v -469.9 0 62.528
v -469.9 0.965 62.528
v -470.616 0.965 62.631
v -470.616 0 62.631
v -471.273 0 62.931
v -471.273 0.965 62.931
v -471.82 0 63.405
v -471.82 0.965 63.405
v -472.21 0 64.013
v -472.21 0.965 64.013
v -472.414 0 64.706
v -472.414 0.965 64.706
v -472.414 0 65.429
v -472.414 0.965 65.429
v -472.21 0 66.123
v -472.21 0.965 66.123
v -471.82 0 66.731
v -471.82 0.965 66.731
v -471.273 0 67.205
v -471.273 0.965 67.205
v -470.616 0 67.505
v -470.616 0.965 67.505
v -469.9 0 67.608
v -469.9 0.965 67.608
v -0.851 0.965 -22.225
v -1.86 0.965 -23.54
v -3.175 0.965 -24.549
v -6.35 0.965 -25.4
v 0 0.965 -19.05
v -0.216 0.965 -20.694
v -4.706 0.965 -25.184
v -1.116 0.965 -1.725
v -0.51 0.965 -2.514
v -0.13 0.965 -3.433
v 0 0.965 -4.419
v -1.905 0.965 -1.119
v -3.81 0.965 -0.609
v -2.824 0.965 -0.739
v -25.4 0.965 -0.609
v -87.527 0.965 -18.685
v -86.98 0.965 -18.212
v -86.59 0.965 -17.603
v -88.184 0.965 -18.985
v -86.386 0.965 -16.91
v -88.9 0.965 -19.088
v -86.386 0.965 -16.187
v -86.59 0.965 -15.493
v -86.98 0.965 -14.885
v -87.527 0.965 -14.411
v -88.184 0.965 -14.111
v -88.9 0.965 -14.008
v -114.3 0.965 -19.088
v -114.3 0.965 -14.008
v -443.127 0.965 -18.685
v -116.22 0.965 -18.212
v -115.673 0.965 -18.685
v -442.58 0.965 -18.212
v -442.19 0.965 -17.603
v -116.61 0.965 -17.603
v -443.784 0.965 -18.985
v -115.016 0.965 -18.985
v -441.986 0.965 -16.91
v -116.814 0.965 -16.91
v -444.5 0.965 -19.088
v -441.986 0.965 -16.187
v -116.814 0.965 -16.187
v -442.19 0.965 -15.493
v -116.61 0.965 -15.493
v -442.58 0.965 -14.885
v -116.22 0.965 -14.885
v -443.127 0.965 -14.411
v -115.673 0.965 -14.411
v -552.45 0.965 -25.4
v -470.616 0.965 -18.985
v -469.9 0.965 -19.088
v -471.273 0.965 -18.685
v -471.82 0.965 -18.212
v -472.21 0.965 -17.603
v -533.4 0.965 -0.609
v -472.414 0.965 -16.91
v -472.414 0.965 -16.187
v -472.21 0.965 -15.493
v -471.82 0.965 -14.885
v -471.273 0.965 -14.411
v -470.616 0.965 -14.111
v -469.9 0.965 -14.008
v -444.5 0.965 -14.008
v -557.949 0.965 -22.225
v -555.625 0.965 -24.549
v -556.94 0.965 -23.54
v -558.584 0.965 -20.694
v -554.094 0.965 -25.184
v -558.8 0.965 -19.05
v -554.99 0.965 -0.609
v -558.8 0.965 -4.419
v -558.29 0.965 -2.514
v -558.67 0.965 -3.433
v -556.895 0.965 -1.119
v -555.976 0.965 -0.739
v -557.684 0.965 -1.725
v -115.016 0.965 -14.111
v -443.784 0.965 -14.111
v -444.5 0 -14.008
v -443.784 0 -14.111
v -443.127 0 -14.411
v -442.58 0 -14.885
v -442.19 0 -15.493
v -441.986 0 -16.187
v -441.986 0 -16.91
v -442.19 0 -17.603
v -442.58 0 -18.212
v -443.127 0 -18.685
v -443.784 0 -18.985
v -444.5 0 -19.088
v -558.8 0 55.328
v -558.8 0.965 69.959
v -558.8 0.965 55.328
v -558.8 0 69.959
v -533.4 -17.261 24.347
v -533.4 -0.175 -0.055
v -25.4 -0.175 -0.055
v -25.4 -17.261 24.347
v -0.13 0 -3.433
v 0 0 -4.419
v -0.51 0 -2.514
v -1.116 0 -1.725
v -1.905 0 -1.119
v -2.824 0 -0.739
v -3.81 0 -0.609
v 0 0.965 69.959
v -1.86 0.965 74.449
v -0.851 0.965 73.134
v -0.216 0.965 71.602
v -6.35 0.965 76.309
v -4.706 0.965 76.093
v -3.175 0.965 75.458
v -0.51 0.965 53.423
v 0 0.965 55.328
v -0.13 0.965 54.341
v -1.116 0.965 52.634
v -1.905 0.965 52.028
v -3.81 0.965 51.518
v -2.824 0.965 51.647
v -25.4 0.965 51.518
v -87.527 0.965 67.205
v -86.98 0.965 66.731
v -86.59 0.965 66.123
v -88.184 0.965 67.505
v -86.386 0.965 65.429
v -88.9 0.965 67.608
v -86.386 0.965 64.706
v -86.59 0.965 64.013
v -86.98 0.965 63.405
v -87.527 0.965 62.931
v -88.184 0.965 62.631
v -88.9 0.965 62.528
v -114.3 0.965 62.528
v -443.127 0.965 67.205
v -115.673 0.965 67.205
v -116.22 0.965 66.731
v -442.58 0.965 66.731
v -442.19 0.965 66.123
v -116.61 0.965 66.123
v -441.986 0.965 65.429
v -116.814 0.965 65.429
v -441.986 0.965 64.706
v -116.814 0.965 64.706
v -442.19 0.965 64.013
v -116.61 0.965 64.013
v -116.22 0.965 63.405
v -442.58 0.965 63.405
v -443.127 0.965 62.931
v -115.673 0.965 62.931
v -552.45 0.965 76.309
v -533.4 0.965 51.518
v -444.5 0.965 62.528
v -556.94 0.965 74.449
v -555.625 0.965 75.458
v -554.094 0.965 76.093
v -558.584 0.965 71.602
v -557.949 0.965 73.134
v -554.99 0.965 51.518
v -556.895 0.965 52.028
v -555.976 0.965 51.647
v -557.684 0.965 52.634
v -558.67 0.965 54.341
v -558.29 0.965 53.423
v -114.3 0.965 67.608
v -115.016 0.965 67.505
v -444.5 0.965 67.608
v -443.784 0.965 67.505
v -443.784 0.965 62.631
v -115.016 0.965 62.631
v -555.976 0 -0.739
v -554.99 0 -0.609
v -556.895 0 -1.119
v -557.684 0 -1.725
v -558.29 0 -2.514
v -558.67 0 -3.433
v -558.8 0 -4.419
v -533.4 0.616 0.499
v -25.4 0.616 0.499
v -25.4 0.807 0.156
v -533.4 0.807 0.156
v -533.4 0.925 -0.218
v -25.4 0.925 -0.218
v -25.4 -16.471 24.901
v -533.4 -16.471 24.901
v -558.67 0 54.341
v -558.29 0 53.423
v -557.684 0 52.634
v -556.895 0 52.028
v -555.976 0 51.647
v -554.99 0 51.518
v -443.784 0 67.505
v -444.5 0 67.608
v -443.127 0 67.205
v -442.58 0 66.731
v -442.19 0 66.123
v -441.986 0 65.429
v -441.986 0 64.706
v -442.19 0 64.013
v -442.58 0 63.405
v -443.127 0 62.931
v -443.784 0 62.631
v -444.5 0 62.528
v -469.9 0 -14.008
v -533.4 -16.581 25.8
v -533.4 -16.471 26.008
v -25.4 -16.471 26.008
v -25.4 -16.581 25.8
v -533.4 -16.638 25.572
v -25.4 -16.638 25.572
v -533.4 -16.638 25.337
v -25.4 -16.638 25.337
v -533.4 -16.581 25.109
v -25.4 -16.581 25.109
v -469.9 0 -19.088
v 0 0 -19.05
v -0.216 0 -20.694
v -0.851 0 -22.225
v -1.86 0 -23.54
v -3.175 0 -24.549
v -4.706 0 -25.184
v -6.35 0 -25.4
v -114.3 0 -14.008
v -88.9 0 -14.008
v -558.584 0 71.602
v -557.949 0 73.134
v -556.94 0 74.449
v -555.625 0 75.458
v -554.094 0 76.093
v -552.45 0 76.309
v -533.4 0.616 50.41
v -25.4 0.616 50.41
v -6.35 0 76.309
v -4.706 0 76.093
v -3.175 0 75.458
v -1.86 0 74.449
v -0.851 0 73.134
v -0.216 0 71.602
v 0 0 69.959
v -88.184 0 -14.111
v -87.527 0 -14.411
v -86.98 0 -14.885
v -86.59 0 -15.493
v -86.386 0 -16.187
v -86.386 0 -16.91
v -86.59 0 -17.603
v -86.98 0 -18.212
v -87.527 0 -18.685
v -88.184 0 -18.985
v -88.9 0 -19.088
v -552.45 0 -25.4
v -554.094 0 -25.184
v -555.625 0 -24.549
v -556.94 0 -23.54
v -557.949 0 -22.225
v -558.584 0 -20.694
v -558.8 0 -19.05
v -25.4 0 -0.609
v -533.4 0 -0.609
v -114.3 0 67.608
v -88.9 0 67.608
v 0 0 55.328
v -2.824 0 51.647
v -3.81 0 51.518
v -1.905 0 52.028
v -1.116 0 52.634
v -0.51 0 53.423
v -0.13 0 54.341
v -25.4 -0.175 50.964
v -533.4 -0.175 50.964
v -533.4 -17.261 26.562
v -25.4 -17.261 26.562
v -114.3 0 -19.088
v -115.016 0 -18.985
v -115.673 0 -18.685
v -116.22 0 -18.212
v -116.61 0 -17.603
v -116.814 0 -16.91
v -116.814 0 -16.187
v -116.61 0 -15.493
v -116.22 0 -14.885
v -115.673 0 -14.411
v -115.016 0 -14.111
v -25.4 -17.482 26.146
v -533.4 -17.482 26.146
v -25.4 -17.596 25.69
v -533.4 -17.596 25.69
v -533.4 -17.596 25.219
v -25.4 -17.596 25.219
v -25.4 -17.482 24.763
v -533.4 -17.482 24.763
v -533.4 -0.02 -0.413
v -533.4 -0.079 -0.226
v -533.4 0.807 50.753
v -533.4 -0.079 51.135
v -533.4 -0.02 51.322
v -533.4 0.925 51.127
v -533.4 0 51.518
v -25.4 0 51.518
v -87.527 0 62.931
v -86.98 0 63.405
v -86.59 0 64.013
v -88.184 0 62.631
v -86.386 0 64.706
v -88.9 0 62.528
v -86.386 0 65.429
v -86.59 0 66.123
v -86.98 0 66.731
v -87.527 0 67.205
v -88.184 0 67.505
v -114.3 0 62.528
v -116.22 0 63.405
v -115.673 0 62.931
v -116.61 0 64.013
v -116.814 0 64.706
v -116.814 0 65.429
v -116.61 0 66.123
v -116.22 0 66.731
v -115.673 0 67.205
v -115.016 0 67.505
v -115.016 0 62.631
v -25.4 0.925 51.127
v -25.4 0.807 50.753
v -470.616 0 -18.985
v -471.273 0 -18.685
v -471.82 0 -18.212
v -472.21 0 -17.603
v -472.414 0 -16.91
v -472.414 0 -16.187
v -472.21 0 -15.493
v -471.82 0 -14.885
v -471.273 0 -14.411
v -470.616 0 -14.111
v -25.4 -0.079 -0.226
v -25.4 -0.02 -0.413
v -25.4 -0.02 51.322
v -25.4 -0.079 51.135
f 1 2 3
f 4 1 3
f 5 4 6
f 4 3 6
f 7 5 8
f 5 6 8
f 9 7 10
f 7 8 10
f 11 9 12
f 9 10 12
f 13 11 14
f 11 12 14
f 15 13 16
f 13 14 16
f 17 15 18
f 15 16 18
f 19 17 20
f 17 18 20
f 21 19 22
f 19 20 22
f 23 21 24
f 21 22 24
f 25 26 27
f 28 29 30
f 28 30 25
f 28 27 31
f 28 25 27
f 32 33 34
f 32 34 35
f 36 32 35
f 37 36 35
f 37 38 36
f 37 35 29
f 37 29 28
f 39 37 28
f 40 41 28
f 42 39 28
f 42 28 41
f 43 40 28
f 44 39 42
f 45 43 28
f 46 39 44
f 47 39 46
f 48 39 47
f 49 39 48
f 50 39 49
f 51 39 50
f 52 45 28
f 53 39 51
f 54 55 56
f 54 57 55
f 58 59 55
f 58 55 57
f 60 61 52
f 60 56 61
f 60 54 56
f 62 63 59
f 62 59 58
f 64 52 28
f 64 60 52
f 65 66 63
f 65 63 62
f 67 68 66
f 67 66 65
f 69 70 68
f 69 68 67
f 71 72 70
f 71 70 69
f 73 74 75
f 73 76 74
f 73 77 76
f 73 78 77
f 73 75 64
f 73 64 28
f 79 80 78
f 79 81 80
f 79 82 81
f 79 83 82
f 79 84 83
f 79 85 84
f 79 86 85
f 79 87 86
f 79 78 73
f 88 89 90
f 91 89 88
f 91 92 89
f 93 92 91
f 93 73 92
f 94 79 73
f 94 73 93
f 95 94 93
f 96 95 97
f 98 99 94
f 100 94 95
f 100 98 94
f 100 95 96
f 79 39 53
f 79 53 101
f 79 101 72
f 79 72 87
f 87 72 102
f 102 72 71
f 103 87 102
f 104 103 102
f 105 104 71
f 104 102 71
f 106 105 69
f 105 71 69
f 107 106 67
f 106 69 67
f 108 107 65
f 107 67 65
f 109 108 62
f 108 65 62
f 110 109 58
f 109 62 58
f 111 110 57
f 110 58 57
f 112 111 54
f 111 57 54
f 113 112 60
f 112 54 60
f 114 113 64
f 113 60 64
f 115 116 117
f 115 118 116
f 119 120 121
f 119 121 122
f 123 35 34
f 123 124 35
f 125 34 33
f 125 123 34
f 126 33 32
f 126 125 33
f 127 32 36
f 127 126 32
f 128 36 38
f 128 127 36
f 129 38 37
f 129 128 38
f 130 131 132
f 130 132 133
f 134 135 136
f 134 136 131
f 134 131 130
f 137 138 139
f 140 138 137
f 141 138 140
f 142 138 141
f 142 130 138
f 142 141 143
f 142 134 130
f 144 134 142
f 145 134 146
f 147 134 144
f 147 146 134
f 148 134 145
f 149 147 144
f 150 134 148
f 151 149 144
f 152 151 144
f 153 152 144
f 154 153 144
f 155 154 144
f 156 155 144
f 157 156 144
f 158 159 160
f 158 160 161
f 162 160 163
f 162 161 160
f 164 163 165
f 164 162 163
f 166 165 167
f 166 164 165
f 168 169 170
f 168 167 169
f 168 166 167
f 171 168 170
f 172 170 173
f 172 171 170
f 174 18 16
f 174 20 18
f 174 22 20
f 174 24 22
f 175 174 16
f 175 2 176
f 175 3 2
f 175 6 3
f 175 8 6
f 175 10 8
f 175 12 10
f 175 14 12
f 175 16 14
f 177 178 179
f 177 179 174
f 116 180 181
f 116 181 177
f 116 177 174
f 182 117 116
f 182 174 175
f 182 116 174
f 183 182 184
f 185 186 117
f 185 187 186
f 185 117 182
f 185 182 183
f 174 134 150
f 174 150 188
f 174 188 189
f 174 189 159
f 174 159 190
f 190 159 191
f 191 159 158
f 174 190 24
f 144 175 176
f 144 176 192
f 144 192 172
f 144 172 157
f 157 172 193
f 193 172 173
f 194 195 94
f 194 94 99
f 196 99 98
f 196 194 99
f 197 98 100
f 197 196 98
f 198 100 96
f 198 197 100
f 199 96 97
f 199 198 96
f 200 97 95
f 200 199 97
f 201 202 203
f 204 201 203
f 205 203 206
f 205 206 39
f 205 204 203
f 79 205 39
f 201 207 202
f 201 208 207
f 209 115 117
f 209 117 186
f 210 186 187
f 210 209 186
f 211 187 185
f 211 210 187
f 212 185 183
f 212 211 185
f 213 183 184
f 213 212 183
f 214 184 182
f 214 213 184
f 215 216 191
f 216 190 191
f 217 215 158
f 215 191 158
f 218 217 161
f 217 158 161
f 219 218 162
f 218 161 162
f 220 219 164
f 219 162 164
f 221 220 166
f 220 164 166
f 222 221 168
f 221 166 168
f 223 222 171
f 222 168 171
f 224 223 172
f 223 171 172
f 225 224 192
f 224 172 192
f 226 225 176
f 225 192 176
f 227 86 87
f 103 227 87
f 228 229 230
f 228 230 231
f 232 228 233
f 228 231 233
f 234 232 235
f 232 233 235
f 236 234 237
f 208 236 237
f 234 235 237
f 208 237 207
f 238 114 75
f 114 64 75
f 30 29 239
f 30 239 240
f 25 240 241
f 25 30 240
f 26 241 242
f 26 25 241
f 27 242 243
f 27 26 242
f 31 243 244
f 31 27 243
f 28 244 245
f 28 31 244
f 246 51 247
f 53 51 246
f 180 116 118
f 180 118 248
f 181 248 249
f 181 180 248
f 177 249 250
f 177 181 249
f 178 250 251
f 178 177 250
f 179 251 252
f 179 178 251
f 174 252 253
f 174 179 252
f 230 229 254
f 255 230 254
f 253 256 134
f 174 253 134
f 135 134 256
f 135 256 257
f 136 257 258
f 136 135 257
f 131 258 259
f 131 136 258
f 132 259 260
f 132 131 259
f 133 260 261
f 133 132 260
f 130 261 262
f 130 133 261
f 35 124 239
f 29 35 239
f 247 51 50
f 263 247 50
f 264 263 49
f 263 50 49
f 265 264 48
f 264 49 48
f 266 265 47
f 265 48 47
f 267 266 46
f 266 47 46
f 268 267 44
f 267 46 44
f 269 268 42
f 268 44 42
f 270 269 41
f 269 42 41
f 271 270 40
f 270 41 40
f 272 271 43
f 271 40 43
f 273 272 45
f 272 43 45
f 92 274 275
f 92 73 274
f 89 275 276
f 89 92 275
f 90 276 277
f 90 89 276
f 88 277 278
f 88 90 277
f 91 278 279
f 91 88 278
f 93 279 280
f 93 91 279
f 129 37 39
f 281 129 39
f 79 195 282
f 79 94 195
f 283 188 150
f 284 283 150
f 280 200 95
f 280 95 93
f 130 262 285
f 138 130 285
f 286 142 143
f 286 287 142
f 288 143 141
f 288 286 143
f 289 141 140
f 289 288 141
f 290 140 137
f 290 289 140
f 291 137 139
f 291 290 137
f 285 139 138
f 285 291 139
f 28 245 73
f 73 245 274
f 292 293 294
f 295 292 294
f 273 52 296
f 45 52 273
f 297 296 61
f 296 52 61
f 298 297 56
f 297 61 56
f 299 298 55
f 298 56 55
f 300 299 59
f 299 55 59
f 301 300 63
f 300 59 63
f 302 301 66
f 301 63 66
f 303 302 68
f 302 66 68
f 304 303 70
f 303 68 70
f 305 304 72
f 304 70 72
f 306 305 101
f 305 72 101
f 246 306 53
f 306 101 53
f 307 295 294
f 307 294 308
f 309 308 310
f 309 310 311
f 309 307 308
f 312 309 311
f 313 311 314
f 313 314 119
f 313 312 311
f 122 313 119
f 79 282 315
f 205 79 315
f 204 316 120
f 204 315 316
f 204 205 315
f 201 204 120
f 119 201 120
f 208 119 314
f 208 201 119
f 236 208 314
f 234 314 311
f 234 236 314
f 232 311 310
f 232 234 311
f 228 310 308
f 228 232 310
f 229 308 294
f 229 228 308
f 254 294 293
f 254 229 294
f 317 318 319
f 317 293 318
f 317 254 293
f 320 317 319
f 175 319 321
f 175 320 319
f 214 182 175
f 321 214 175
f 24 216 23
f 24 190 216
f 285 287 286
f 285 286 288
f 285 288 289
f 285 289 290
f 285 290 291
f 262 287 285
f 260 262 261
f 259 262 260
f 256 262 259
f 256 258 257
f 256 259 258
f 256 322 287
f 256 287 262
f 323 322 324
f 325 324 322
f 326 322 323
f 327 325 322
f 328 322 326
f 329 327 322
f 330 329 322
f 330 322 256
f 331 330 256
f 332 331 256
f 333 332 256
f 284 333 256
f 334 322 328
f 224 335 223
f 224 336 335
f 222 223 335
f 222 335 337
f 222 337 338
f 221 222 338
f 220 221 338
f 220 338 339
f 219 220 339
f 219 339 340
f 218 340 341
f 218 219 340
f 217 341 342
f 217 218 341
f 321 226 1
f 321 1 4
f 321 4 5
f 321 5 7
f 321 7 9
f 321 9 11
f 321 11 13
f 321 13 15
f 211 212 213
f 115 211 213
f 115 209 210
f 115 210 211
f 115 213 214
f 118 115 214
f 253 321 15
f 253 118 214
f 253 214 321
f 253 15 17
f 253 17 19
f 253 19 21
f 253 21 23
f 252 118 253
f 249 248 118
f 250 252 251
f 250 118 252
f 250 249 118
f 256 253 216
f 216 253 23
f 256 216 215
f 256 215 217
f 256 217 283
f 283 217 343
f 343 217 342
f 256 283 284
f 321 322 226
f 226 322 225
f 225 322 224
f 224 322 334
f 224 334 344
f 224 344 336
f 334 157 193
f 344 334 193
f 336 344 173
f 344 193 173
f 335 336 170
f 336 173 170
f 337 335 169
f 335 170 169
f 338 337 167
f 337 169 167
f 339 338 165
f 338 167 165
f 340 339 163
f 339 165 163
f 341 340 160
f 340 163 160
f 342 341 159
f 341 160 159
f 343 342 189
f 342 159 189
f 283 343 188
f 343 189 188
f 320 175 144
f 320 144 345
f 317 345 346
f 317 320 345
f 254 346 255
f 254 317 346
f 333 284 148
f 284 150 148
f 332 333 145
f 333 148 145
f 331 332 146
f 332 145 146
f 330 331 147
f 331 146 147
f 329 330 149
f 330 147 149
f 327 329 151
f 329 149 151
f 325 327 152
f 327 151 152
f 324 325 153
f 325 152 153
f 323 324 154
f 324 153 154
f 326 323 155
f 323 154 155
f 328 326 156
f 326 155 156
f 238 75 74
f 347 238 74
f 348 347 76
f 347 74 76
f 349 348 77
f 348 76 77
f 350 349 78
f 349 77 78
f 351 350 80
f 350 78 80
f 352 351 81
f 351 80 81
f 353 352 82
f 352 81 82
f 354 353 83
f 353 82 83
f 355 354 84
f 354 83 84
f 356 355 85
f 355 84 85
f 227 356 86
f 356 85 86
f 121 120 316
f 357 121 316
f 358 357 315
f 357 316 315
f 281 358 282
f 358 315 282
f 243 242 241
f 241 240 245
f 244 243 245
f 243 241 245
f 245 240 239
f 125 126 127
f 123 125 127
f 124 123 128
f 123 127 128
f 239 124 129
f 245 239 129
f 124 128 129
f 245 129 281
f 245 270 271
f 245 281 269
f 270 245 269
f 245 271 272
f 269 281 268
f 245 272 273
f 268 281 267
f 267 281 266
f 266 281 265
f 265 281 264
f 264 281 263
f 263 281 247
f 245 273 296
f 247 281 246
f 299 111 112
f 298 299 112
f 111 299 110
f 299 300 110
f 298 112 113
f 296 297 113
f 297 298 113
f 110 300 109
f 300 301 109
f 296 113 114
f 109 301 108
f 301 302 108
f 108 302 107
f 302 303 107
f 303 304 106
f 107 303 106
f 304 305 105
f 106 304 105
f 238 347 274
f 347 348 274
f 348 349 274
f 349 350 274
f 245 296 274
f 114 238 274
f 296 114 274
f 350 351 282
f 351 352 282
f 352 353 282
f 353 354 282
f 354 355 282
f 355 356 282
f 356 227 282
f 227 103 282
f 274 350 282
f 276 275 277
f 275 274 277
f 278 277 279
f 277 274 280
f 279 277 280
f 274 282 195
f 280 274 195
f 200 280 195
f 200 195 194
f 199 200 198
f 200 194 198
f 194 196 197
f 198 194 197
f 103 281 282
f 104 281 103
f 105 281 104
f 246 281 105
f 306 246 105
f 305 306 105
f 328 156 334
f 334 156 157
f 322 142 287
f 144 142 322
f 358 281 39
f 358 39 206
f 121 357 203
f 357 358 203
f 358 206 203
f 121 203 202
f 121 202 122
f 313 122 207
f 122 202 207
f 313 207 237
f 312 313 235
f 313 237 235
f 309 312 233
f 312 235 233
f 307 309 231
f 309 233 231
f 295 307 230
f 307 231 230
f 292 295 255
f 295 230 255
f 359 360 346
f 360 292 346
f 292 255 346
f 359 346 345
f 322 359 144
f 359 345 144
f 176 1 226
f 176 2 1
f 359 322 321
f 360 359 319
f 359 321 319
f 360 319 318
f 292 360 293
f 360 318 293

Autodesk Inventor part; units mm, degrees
ref_plane "YZ Plane" through (0, 0, 0) normal (1, 0, 0) x (0, 1, 0)
ref_plane "XZ Plane" through (0, 0, 0) normal (0, 1, 0) x (-1, 0, 0)
ref_plane "XY Plane" through (0, 0, 0) normal (0, 0, 1) x (1, 0, 0)
sketch "Sketch1" plane through (0, 0, 0) normal (0, 1, 0) x (-1, 0, 0)
  line L0 (0, 0) -> (0, -25.4)
  line L1 (0, -25.4) -> (558.8, -25.4)
  line L2 (558.8, -25.4) -> (558.8, 0)
  line L3 (558.8, 0) -> (0, 0)
  dimension "d0" = 25.4
  dimension "d1" = 558.8
extrude "Plate1" add sketch "Sketch1" along normal blind 0.9652
sketch "Sketch2" plane through (-558.8, 0.1746, -0.5536) normal (0, 0.819152, 0.5735764) x (-1, 0, 0)
  line L0 (-558.8, 0) -> (0, 0)
  line L1 (0, 0) -> (0, 31.75)
  line L2 (0, 31.75) -> (-558.8, 31.75)
  line L3 (-558.8, 31.75) -> (-558.8, 0)
edge flange "Flange1" height 31.75 angle 35 thickness 0.9652 bend radius 0.9652 thickness toward (0, 0.819152, 0.5735764) relief tear relief width 0.9652 relief depth 0.4826 edges at (-279.4, 0, 0) wall of the first edge with corners at (0, 0.1746, -0.5536) (-558.8, 0.1746, -0.5536) (-558.8, -18.0365, 25.4545) (0, -18.0365, 25.4545)
bend "Bend1"
corner "Corner1"
sketch "Sketch3" plane through (0, -17.2459, 24.9008) normal (0, -0.819152, 0.5735764) x (1, 0, 0)
  line L0 (-558.8, 0) -> (0, 0)
  line L1 (0, 0) -> (0, 31.75)
  line L2 (0, 31.75) -> (-558.8, 31.75)
  line L3 (-558.8, 31.75) -> (-558.8, 0)
edge flange "Flange2" height 31.75 angle 70 thickness 0.9652 bend radius 0.9652 thickness toward (0, -0.819152, 0.5735764) relief tear relief width 0.9652 relief depth 0.4826 edges at (-279.4, -17.2459, 26.0081) wall of the first edge with corners at (-558.8, -17.2459, 24.9008) (0, -17.2459, 24.9008) (0, 0.9652, 50.9089) (-558.8, 0.9652, 50.9089)
bend "Bend2"
corner "Corner2"
sketch "Sketch4" plane through (-558.8, 0, 50.9089) normal (0, 1, 0) x (-1, 0, 0)
  line L0 (-558.8, 0) -> (0, 0)
  line L1 (0, 0) -> (0, 25.4)
  line L2 (0, 25.4) -> (-558.8, 25.4)
  line L3 (-558.8, 25.4) -> (-558.8, 0)
edge flange "Flange3" height 25.4 angle 35 thickness 0.9652 bend radius 0.9652 thickness toward (0, 1, 0) relief tear relief width 0.9652 relief depth 0.4826 edges at (-279.4, 0.1746, 51.4625) wall of the first edge with corners at (0, 0, 50.9089) (-558.8, 0, 50.9089) (-558.8, 0, 76.3089) (0, 0, 76.3089)
bend "Bend3"
corner "Corner3"
sketch "Sketch5" plane through (0, 0.9652, 0) normal (0, 1, 0) x (1, 0, 0)
  line L0 (0, -51.5176) -> (-25.4, -51.5176)
  line L1 (0, -51.5176) -> (0, -50.4103) projected
  line L2 (0, -51.5176) -> (0, 0.6087)
  line L3 (0, 0.6087) -> (-25.4, 0.6087)
  line L4 (-25.4, 0.6087) -> (-25.4, -51.5176)
  line L5 (-114.3, -65.0679) -> (-88.9, -65.0679) construction
  line L6 (-114.3, -67.6079) -> (-88.9, -67.6079)
  line L7 (-88.9, -62.5279) -> (-114.3, -62.5279)
  arc A0 (-114.3, -62.5279) -> (-114.3, -67.6079) centre (-114.3, -65.0679) ccw
  arc A1 (-88.9, -67.6079) -> (-88.9, -62.5279) centre (-88.9, -65.0679) ccw
  line L8 (-87.7062, -24.2598) -> (31.8104, -24.2598) construction
  line L9 (-114.3, 19.0882) -> (-88.9, 19.0882)
  line L10 (-88.9, 14.0082) -> (-114.3, 14.0082)
  arc A2 (-114.3, 19.0882) -> (-114.3, 14.0082) centre (-114.3, 16.5482) ccw
  arc A3 (-88.9, 14.0082) -> (-88.9, 19.0882) centre (-88.9, 16.5482) ccw
  line L11 (0, -76.3089) -> (-558.8, -76.3089) projected
  line L12 (-279.4, -268.3812) -> (-279.4, 122.1946) construction
  line L13 (-558.8, -51.5176) -> (-533.4, -51.5176)
  line L14 (-558.8, -51.5176) -> (-558.8, 0.6087)
  line L15 (-558.8, 0.6087) -> (-533.4, 0.6087)
  line L16 (-533.4, 0.6087) -> (-533.4, -51.5176)
  line L17 (-444.5, -67.6079) -> (-469.9, -67.6079)
  line L18 (-469.9, -62.5279) -> (-444.5, -62.5279)
  arc A4 (-444.5, -67.6079) -> (-444.5, -62.5279) centre (-444.5, -65.0679) ccw
  arc A5 (-469.9, -62.5279) -> (-469.9, -67.6079) centre (-469.9, -65.0679) ccw
  line L19 (-469.9, 14.0082) -> (-444.5, 14.0082)
  arc A6 (-444.5, 14.0082) -> (-444.5, 19.0882) centre (-444.5, 16.5482) ccw
  line L20 (-444.5, 19.0882) -> (-469.9, 19.0882)
  arc A7 (-469.9, 19.0882) -> (-469.9, 14.0082) centre (-469.9, 16.5482) ccw
  line L21 (0, -51.5176) -> (0, -76.3089) projected
  point P0 (0, 0)
  point P1 (-101.6, -65.0679)
  point P2 (-457.2, -65.0679)
  dimension "d36" = 25.4
  dimension "d37" = 25.4
  dimension "d38" = 5.08
  dimension "d41" = 88.9
extrude "Cut1" cut sketch "Sketch5" against normal up to next
fillet "Corner Round1" radius 6.35 4 edges at (0, 0.4826, -25.4) (-558.8, 0.4826, 76.3089) (-558.8, 0.4826, -25.4) (0, 0.4826, 76.3089)
fillet "Corner Round2" radius 3.81 4 edges at (-558.8, 0.4826, 51.5176) (0, 0.4826, -0.6087) (0, 0.4826, 51.5176) (-558.8, 0.4826, -0.6087)
sketch "Sketch6" plane through (-533.4, 0.9652, 51.5176) normal (0, 1, 0) x (1, 0, 0)
  point P0 (533.4, 51.5176)
equation "\"d39\" = Thickness"
equation "\"d3\" = BendReliefWidth"
equation "\"d4\" = BendReliefDepth"
equation "\"d5\" = MinimumRemnant"
equation "\"d6\" = BendRadius"
equation "\"d9\" = BendRadius"
equation "\"d10\" = CornerReliefSize"
equation "\"d11\" = GapSize"
equation "\"d12\" = JacobiRadiusSize"
equation "\"d13\" = BendReliefWidth"
equation "\"d14\" = BendReliefDepth"
equation "\"d15\" = MinimumRemnant"
equation "\"d16\" = BendRadius"
equation "\"d19\" = BendRadius"
equation "\"d20\" = CornerReliefSize"
equation "\"d21\" = GapSize"
equation "\"d22\" = JacobiRadiusSize"
equation "\"d23\" = BendReliefWidth"
equation "\"d24\" = BendReliefDepth"
equation "\"d25\" = MinimumRemnant"
equation "\"d26\" = BendRadius"
equation "\"d29\" = BendRadius"
equation "\"d30\" = CornerReliefSize"
equation "\"d31\" = GapSize"
equation "\"d32\" = JacobiRadiusSize"
equation "\"BendRadius\" = Thickness"
equation "\"BendReliefWidth\" = Thickness"
equation "\"BendReliefDepth\" = 0.5 * Thickness"
equation "\"CornerReliefSize\" = 4 * Thickness"
equation "\"MinimumRemnant\" = 2 * Thickness"
equation "\"TransitionRadius\" = BendRadius"
equation "\"JacobiRadiusSize\" = BendRadius"
equation "\"GapSize\" = Thickness"
equation "\"d2\" = BendRadius"
equation "\"Thickness\" = 0.9652"
properties part number "Control pipe holder V2" material "Stainless Steel"
